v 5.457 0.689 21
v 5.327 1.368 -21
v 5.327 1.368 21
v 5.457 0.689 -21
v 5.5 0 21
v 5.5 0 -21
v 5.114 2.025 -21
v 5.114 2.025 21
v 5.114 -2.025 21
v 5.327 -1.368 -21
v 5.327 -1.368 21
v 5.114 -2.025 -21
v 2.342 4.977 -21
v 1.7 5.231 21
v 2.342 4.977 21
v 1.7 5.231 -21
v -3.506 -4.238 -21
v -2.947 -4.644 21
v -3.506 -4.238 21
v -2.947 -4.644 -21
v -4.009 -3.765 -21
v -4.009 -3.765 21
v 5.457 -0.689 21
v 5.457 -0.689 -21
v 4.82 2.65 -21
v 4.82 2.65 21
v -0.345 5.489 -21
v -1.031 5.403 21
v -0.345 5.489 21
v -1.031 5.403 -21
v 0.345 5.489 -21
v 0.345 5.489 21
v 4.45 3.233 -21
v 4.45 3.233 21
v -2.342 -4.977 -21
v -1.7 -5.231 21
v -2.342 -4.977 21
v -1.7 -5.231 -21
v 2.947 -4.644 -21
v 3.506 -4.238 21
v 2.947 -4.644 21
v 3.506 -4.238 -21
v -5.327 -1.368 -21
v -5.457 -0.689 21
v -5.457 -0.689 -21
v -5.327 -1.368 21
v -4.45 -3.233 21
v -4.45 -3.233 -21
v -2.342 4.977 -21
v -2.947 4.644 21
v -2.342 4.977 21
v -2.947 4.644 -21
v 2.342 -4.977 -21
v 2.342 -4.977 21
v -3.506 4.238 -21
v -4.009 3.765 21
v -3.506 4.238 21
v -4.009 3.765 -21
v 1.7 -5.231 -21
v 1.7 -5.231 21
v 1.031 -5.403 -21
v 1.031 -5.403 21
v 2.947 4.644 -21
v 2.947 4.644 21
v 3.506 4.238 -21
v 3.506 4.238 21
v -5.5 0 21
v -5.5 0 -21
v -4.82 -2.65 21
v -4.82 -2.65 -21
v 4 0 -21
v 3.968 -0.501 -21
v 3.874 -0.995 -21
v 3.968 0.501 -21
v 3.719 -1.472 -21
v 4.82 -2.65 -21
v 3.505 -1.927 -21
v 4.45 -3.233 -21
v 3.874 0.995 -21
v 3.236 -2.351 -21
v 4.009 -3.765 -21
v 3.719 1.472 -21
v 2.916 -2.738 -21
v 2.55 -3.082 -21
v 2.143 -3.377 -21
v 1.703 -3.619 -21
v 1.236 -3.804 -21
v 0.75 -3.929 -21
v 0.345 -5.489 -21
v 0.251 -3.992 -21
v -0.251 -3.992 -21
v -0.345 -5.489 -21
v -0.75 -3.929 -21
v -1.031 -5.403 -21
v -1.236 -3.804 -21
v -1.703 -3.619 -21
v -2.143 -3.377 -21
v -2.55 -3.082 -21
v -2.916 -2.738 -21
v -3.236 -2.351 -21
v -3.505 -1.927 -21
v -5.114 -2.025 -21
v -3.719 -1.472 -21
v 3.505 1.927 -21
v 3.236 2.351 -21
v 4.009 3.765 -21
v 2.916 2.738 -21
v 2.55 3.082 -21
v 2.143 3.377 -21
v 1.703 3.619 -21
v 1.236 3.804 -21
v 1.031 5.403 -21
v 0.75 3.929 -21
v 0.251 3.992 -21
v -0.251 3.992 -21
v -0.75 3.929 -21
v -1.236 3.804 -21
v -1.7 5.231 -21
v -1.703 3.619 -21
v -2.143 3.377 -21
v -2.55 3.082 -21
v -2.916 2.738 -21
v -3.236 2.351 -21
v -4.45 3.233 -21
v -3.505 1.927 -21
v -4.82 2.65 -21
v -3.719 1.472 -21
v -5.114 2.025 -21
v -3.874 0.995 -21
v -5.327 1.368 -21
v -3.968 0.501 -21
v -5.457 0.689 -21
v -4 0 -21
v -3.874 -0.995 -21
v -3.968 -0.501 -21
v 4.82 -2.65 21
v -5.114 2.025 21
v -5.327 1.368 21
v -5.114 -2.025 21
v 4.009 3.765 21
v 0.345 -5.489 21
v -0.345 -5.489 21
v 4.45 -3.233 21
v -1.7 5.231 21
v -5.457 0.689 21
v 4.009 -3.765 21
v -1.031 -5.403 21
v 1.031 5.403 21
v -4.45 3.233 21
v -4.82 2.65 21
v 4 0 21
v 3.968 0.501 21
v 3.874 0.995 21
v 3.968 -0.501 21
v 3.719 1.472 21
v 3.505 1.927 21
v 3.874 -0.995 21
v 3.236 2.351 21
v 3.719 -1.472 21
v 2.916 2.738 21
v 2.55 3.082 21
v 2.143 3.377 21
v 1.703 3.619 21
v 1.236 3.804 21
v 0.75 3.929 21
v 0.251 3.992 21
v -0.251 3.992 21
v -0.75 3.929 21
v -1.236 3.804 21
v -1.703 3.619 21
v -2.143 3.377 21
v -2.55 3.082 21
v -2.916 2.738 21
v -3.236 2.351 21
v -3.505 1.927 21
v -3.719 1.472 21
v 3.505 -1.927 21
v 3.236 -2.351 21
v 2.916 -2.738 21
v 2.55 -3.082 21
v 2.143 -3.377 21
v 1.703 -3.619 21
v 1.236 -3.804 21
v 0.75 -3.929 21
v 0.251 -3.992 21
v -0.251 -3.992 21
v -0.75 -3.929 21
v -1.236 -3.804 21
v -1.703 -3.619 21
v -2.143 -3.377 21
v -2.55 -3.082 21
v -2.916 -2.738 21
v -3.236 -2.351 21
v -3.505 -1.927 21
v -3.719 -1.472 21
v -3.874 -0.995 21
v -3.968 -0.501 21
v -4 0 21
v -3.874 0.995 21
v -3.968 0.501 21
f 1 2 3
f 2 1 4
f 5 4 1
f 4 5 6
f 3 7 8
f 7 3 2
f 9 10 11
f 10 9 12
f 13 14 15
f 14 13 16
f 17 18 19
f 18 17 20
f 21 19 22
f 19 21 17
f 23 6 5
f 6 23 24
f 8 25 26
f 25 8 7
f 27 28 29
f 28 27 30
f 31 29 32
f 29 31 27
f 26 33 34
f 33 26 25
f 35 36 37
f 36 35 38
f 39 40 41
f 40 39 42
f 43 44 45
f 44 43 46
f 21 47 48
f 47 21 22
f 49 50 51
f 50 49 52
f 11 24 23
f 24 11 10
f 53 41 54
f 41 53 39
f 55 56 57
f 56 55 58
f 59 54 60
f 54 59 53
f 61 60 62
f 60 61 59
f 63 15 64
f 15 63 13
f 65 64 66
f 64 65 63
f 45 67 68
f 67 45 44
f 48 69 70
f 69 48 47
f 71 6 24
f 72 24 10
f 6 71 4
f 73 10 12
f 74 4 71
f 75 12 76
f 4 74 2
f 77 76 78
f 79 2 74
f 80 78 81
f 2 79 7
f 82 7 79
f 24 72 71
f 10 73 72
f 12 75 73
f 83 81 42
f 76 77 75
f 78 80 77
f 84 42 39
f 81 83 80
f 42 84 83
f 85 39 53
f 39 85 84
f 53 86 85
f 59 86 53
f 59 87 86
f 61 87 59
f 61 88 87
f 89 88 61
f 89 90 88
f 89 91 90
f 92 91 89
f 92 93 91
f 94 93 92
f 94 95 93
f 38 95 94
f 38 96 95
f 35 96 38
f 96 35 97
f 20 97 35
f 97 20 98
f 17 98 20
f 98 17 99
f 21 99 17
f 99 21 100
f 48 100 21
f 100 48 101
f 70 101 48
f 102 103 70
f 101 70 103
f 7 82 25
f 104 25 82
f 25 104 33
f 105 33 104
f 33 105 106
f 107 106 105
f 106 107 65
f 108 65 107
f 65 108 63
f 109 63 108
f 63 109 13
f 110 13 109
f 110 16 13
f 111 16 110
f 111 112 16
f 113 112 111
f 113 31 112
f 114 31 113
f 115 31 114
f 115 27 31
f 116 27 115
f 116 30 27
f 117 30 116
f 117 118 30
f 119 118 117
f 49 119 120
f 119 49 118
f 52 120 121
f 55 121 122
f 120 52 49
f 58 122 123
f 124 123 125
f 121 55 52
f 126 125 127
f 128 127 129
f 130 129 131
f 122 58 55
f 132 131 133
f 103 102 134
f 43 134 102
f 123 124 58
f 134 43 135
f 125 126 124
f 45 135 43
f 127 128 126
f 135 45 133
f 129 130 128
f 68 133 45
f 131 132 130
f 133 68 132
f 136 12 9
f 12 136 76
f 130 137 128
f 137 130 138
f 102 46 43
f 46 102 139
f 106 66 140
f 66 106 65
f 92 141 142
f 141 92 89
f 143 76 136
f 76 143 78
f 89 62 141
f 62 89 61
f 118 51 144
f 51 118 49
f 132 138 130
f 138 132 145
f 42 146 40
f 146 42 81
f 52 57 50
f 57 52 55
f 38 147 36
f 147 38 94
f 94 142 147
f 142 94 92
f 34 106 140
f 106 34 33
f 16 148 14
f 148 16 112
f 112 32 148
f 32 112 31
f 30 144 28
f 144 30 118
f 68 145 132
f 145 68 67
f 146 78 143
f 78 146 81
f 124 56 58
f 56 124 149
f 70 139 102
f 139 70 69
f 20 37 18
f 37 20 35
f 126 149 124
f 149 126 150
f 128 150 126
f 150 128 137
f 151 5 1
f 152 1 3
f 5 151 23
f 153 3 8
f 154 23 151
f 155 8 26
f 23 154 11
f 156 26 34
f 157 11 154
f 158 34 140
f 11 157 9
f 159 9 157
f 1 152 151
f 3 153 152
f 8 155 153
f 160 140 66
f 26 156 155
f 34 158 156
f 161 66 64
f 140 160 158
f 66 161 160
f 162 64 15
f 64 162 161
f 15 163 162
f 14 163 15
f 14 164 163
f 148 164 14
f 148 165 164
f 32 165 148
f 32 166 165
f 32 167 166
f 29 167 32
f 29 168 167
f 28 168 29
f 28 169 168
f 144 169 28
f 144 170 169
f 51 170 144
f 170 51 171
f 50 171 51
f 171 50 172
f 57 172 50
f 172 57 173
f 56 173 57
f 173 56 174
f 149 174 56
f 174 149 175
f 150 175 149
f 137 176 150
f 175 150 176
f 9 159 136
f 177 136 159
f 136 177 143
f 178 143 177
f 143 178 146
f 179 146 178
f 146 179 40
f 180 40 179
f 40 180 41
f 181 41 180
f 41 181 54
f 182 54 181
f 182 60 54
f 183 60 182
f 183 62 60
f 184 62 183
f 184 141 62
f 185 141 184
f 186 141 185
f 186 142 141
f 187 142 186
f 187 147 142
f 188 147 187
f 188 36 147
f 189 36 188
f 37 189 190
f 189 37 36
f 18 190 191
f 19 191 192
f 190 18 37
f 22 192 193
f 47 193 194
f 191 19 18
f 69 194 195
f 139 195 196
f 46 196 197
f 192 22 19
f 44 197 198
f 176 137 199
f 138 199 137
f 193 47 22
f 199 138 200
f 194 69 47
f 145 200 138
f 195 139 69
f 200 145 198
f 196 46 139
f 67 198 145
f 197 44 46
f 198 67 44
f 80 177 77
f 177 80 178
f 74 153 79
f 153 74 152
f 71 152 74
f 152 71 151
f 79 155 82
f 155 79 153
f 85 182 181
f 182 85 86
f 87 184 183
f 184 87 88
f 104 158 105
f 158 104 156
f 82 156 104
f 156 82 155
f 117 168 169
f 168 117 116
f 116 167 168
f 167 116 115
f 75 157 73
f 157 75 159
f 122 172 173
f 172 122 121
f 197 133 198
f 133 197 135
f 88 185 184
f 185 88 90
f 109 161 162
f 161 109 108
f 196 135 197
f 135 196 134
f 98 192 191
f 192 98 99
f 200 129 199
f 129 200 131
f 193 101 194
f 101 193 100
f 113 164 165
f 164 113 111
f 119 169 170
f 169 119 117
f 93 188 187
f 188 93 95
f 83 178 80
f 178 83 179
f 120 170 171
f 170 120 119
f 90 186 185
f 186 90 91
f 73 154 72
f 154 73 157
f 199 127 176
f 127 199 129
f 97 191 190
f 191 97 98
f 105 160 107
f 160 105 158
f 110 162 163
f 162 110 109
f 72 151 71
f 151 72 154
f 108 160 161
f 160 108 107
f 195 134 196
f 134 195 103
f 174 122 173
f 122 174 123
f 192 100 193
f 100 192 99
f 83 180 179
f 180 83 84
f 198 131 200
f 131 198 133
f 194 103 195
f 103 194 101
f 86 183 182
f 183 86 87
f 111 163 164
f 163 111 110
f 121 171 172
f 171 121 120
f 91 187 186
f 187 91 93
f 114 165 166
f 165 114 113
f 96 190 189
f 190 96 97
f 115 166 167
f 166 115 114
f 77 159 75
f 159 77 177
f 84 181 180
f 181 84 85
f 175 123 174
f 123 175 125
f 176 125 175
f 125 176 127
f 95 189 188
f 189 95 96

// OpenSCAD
$fn = 50;


difference() {
	union() {
		translate(v = [0, 0, -21.0000000000]) {
			cylinder(h = 42, r = 5.5000000000);
		}
	}
	union() {
		translate(v = [0, 0, -100.0000000000]) {
			cylinder(h = 200, r = 4.0000000000);
		}
	}
}
